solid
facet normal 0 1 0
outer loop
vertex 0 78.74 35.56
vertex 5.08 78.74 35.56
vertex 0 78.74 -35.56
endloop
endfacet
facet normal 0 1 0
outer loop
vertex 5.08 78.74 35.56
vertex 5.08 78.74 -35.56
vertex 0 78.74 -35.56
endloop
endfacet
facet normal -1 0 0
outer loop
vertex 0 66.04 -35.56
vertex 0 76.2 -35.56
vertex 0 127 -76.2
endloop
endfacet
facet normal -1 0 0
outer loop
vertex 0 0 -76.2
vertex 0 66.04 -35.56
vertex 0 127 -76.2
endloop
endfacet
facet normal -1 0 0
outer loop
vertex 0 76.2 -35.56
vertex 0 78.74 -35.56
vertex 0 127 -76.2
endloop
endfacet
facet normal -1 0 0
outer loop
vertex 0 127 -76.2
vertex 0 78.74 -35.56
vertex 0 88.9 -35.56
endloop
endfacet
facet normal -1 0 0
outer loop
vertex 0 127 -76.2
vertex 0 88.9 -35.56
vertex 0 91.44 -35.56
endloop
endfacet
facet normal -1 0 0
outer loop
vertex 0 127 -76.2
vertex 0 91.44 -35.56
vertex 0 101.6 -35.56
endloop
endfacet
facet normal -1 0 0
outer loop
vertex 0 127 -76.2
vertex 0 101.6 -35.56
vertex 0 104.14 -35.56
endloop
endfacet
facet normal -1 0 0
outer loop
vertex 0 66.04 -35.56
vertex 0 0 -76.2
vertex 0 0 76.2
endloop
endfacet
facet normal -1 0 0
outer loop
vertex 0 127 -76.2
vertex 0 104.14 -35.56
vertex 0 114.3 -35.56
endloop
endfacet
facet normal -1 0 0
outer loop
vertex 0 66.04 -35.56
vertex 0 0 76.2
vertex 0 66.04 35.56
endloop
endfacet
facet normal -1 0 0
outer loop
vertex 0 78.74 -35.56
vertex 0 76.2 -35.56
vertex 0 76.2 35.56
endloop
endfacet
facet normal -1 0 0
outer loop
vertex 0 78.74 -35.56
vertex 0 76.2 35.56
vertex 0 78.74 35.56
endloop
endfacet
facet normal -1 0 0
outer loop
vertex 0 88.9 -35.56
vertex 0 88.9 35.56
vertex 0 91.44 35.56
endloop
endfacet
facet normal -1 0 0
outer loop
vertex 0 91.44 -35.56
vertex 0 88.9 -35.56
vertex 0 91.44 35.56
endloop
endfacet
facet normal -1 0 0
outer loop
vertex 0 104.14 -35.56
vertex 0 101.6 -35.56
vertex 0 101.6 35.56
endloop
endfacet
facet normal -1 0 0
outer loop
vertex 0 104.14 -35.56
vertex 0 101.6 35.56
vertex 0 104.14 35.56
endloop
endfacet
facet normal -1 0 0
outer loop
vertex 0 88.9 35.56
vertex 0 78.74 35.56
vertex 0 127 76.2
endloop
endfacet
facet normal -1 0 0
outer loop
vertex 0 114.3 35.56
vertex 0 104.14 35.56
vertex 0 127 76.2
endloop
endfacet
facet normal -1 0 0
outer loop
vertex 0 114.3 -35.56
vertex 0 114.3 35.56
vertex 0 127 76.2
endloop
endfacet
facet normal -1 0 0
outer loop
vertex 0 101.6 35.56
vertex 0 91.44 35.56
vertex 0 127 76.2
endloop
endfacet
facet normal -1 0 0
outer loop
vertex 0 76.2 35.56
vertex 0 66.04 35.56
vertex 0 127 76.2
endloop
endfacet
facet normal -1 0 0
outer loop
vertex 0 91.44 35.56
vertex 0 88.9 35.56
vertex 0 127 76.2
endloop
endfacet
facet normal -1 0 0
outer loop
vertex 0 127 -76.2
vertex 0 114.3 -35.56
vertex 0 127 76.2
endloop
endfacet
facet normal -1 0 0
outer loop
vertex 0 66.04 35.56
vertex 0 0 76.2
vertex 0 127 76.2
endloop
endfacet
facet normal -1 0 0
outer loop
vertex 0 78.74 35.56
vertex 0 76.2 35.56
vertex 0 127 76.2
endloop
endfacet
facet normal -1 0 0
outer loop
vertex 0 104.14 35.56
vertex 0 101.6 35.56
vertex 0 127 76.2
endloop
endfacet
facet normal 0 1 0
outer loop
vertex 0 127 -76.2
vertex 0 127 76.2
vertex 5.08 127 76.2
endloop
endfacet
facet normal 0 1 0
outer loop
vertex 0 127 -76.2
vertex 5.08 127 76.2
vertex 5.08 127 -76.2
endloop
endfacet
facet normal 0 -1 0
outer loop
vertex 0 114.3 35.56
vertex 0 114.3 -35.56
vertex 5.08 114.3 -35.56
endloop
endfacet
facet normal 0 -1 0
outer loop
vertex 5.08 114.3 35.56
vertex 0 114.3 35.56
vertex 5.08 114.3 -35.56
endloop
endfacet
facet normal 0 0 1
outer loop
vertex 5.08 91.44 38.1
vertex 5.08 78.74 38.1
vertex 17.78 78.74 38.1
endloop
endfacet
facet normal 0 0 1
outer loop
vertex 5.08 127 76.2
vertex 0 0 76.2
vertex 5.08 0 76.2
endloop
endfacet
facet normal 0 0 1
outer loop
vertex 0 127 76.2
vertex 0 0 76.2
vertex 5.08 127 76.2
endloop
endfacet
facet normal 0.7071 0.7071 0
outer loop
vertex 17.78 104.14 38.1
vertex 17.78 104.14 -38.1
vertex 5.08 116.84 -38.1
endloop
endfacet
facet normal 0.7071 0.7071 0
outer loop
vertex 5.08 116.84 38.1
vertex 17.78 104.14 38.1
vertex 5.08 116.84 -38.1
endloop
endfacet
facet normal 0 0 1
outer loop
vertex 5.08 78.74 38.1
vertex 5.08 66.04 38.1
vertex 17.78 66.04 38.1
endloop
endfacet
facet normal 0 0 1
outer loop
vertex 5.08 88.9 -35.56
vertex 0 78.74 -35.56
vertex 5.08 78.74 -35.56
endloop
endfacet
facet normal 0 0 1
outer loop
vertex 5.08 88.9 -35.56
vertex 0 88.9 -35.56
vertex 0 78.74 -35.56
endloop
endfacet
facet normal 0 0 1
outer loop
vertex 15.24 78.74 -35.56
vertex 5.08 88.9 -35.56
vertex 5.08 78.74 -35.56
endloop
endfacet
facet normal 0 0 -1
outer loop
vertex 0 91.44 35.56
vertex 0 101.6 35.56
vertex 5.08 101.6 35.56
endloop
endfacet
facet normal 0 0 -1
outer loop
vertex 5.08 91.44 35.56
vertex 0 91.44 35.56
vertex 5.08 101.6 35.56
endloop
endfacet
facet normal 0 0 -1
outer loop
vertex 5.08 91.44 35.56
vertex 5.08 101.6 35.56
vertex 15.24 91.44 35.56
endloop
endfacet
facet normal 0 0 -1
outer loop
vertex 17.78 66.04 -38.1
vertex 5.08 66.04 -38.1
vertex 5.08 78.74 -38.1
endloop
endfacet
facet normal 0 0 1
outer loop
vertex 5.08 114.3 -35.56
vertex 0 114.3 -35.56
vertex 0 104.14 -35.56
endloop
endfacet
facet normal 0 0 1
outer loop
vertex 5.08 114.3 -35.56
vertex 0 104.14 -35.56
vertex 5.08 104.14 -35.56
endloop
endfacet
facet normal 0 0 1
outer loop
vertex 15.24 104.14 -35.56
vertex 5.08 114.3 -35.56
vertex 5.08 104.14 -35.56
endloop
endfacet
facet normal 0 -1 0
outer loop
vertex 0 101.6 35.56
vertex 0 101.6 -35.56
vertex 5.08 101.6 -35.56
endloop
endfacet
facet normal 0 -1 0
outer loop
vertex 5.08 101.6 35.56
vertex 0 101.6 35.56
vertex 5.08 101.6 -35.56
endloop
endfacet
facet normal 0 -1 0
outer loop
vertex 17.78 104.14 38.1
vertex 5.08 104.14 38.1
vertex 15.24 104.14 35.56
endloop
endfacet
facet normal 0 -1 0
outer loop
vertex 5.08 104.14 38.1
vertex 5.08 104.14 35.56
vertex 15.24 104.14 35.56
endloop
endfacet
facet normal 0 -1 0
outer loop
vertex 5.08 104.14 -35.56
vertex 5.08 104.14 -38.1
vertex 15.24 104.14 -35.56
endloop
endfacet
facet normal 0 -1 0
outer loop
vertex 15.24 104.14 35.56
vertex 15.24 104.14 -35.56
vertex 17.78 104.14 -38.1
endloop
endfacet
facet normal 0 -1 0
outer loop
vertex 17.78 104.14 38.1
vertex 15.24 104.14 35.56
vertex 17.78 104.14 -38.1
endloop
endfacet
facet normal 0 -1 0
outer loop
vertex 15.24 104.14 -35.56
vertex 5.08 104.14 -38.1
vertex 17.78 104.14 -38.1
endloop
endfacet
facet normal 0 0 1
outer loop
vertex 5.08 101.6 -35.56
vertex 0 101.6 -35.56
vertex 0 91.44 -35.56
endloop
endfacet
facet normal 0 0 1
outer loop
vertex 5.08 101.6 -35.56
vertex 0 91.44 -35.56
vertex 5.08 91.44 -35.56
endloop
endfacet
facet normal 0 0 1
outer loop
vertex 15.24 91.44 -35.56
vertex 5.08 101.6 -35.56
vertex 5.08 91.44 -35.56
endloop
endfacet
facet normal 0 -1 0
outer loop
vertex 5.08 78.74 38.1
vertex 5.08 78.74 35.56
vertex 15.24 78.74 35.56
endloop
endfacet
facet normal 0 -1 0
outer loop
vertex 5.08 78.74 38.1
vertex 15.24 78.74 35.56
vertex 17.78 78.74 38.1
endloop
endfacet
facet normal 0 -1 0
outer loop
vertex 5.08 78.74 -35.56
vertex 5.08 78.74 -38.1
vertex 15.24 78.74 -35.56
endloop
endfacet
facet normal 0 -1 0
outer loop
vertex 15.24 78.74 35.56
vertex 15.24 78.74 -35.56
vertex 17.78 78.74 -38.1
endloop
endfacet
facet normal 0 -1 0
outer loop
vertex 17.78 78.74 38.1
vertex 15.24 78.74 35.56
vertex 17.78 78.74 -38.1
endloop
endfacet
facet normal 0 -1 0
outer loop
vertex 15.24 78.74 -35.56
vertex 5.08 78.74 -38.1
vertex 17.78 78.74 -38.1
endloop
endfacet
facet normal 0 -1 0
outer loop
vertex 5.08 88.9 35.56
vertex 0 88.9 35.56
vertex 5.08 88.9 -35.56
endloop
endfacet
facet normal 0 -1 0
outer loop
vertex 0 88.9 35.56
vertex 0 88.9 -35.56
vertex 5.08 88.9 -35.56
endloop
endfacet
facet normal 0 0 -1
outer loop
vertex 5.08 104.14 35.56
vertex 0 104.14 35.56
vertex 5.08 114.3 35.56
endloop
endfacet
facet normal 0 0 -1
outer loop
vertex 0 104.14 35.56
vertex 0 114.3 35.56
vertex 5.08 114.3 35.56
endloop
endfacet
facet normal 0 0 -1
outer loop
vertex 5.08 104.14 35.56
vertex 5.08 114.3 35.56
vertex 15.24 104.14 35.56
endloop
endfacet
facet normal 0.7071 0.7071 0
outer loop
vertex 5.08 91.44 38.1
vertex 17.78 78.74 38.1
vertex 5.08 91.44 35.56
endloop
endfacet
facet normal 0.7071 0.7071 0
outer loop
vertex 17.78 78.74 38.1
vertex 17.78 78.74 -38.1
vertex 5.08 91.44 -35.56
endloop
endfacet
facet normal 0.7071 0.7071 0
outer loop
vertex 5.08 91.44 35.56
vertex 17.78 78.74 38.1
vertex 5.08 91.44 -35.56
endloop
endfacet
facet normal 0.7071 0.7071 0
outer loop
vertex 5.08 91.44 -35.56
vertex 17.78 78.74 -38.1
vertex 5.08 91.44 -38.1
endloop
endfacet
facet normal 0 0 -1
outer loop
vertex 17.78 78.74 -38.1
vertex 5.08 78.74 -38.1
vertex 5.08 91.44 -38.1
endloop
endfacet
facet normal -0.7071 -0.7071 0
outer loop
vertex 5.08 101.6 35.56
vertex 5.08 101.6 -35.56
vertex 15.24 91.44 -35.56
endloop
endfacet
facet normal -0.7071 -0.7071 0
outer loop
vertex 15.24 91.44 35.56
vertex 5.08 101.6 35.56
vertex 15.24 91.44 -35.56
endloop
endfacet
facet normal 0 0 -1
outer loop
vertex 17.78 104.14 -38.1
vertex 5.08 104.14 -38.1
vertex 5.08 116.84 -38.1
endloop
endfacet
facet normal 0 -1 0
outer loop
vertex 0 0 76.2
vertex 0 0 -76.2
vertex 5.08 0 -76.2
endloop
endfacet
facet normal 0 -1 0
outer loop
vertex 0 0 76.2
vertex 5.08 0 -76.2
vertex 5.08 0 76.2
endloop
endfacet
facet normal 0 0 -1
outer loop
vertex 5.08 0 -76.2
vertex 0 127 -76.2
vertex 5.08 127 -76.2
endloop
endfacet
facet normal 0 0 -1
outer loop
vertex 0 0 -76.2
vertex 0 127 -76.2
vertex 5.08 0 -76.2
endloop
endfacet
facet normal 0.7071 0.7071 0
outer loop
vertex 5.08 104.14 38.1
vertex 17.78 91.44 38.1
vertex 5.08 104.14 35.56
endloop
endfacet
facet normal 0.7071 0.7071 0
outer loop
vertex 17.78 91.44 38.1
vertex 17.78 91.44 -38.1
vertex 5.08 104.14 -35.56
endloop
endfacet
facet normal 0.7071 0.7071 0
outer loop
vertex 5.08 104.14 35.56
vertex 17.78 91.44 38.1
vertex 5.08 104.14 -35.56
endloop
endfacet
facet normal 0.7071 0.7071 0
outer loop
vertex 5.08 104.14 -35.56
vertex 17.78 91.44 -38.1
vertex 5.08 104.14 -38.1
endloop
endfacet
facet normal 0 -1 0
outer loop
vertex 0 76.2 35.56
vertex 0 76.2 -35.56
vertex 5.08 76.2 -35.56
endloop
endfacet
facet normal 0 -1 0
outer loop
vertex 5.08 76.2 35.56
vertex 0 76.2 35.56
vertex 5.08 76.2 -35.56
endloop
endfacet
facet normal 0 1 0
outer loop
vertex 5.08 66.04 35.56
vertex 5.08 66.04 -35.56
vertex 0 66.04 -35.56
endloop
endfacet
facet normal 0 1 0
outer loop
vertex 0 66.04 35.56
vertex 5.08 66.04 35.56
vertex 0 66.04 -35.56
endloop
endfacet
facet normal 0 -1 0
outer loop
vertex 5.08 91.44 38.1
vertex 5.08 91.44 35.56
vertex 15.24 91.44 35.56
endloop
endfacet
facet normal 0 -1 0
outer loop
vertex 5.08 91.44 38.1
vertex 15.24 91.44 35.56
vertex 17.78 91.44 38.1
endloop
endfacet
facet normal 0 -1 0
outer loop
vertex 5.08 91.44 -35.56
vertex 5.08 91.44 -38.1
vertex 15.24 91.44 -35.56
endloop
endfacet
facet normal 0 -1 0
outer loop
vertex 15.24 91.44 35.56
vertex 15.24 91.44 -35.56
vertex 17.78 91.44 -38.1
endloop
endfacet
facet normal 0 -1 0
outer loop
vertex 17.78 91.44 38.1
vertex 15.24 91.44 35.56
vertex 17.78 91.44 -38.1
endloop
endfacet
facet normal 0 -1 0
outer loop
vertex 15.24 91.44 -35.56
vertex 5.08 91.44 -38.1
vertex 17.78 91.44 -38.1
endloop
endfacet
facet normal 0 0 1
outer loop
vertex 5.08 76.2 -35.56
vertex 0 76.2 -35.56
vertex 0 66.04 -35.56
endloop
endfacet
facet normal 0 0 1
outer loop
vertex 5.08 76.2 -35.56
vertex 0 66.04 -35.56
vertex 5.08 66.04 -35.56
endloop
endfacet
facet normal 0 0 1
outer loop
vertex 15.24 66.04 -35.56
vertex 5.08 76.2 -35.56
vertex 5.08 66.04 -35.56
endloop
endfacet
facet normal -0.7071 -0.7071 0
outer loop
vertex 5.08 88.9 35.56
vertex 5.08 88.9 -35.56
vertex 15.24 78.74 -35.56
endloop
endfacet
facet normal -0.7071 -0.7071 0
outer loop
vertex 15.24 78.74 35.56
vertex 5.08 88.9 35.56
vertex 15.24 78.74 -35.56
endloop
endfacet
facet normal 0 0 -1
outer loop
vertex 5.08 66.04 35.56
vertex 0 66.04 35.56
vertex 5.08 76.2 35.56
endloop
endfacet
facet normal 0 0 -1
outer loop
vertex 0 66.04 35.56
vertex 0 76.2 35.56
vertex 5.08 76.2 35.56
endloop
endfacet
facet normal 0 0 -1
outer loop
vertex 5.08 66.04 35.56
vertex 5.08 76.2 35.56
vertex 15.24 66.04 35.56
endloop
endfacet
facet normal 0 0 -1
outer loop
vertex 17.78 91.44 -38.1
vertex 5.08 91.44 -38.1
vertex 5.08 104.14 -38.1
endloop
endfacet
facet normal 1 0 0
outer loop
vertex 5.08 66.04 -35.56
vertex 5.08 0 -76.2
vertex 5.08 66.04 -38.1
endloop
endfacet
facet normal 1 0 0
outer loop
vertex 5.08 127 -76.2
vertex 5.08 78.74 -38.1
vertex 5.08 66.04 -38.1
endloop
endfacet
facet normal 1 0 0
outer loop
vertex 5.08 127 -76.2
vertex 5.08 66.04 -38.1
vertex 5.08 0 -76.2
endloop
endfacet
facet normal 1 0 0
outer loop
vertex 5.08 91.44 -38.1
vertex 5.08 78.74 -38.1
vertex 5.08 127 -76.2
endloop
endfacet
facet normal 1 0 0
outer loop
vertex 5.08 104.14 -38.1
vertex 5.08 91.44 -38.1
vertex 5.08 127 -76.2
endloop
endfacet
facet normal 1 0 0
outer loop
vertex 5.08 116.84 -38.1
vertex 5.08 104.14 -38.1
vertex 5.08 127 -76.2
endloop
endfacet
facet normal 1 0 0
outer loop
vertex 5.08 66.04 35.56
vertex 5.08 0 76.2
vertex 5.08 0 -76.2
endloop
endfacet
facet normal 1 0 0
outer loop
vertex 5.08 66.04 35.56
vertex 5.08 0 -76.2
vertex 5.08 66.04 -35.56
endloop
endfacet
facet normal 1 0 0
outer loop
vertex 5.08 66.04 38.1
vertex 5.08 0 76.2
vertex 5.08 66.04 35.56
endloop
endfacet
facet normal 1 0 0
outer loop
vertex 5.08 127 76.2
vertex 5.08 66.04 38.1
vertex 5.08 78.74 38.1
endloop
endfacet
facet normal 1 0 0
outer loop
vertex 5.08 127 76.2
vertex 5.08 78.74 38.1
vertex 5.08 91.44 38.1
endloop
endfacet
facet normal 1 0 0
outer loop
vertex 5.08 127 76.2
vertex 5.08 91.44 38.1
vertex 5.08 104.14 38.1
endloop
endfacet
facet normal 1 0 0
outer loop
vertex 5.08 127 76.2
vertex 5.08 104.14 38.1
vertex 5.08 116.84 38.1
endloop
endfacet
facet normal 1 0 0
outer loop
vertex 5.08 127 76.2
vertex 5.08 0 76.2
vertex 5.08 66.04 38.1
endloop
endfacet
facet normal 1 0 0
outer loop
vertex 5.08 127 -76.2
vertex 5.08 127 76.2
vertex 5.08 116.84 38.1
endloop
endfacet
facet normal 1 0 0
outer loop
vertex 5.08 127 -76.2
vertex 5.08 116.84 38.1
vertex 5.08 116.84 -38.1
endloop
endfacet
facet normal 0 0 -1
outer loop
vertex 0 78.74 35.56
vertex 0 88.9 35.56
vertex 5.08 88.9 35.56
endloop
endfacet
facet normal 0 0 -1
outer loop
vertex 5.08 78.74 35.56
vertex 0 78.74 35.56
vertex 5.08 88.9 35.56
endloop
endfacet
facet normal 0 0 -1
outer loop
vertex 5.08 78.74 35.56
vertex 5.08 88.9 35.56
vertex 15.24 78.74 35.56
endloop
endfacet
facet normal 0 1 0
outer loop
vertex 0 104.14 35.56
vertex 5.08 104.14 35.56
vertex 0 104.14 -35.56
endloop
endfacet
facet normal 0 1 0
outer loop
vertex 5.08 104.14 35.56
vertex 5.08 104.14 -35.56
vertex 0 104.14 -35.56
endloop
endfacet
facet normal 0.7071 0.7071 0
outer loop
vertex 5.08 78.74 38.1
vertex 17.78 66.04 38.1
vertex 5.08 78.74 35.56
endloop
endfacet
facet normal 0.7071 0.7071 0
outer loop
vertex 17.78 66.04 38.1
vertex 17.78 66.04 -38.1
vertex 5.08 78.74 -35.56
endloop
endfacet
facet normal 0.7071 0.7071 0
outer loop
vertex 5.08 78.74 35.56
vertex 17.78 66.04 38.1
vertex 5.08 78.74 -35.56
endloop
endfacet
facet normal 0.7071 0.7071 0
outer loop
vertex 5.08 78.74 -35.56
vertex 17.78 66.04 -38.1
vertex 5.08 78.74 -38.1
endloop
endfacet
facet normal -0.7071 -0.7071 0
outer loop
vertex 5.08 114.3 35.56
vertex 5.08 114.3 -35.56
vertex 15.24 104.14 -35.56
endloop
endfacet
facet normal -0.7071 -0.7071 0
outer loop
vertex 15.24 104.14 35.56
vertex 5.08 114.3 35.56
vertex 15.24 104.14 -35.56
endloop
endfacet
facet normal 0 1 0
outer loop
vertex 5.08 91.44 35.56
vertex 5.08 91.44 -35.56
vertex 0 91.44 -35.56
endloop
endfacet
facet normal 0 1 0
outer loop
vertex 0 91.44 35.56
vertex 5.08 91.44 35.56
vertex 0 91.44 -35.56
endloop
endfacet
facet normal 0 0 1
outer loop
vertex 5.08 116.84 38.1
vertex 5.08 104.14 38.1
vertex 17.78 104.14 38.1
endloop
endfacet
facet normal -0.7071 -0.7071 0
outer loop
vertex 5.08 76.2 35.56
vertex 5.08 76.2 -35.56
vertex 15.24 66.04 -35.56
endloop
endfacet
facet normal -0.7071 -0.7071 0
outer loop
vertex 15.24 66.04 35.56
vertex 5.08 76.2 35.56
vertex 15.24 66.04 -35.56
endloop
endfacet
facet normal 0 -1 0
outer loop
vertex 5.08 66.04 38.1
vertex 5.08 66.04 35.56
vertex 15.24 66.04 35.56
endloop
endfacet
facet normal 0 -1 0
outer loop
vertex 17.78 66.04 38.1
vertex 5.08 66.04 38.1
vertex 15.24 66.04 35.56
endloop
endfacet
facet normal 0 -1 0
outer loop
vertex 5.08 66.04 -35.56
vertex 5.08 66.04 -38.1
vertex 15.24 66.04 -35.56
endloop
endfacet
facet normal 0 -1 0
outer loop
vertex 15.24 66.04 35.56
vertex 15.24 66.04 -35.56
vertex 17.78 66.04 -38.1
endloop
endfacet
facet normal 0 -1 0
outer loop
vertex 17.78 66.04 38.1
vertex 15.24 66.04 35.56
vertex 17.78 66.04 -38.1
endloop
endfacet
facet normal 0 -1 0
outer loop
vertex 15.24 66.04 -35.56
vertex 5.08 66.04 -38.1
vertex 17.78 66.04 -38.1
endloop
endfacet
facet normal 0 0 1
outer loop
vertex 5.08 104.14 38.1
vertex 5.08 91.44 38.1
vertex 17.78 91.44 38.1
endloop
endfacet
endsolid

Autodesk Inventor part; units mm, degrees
ref_plane "YZ Plane" through (0, 0, 0) normal (1, 0, 0) x (0, 1, 0)
ref_plane "XZ Plane" through (0, 0, 0) normal (0, 1, 0) x (-1, 0, 0)
sketch "Sketch1" plane through (0, 0, 0) normal (1, 0, 0) x (0, 1, 0)
  line L0 (0, 76.2) -> (127, 76.2)
  line L1 (127, 76.2) -> (127, -76.2)
  line L2 (127, -76.2) -> (0, -76.2)
  line L3 (0, -76.2) -> (0, 76.2)
  point P0 (0, 0)
  point P1 (0, 0)
  dimension "d0" = 127
  dimension "d1" = 152.4
extrude "Extrusion1" add sketch "Sketch1" along normal blind 5.08
sketch "Sketch11" plane through (0, 0, 0) normal (0, 0, 1) x (1, 0, 0)
  line L0 (5.08, 127) -> (5.08, 0) projected
  line L1 (5.08, 0) -> (5.08, 127) projected
  line L2 (5.08, 116.84) -> (5.08, 104.14)
  line L3 (5.08, 104.14) -> (17.78, 104.14)
  line L4 (17.78, 104.14) -> (5.08, 116.84)
  line L5 (0, 127) -> (5.08, 127) projected
  point P0 (0, 0)
  point P1 (2.54, 127)
  dimension "d31" = 10.16
  dimension "d32" = 12.7
  dimension "d33" = 45
extrude "Extrusion5" add sketch "Sketch11" along normal mid plane 76.2
ref_plane "Work Plane5" through (0, 0, 0) normal (0, 0, 1) x (1, 0, 0)
sketch "Sketch17" plane through (0, 0, 0) normal (0, 0, 1) x (1, 0, 0)
  line L0 (0, 0) -> (0, 127) projected
  line L1 (17.78, 104.14) -> (5.08, 104.14) projected
  line L2 (15.24, 104.14) -> (0, 104.14)
  line L3 (0, 114.3) -> (5.08, 114.3)
  line L4 (5.08, 0) -> (5.08, 127) projected
  line L5 (5.08, 114.3) -> (15.24, 104.14)
  line L6 (0, 104.14) -> (0, 114.3)
  dimension "d45" = 10.16
  dimension "d46" = 45
extrude "Extrusion6" cut sketch "Sketch17" along normal mid plane 71.12
pattern_linear "Rectangular Pattern4" count 4 spacing 12.7 along (0, -1, 0) of "Extrusion5", "Extrusion6"
